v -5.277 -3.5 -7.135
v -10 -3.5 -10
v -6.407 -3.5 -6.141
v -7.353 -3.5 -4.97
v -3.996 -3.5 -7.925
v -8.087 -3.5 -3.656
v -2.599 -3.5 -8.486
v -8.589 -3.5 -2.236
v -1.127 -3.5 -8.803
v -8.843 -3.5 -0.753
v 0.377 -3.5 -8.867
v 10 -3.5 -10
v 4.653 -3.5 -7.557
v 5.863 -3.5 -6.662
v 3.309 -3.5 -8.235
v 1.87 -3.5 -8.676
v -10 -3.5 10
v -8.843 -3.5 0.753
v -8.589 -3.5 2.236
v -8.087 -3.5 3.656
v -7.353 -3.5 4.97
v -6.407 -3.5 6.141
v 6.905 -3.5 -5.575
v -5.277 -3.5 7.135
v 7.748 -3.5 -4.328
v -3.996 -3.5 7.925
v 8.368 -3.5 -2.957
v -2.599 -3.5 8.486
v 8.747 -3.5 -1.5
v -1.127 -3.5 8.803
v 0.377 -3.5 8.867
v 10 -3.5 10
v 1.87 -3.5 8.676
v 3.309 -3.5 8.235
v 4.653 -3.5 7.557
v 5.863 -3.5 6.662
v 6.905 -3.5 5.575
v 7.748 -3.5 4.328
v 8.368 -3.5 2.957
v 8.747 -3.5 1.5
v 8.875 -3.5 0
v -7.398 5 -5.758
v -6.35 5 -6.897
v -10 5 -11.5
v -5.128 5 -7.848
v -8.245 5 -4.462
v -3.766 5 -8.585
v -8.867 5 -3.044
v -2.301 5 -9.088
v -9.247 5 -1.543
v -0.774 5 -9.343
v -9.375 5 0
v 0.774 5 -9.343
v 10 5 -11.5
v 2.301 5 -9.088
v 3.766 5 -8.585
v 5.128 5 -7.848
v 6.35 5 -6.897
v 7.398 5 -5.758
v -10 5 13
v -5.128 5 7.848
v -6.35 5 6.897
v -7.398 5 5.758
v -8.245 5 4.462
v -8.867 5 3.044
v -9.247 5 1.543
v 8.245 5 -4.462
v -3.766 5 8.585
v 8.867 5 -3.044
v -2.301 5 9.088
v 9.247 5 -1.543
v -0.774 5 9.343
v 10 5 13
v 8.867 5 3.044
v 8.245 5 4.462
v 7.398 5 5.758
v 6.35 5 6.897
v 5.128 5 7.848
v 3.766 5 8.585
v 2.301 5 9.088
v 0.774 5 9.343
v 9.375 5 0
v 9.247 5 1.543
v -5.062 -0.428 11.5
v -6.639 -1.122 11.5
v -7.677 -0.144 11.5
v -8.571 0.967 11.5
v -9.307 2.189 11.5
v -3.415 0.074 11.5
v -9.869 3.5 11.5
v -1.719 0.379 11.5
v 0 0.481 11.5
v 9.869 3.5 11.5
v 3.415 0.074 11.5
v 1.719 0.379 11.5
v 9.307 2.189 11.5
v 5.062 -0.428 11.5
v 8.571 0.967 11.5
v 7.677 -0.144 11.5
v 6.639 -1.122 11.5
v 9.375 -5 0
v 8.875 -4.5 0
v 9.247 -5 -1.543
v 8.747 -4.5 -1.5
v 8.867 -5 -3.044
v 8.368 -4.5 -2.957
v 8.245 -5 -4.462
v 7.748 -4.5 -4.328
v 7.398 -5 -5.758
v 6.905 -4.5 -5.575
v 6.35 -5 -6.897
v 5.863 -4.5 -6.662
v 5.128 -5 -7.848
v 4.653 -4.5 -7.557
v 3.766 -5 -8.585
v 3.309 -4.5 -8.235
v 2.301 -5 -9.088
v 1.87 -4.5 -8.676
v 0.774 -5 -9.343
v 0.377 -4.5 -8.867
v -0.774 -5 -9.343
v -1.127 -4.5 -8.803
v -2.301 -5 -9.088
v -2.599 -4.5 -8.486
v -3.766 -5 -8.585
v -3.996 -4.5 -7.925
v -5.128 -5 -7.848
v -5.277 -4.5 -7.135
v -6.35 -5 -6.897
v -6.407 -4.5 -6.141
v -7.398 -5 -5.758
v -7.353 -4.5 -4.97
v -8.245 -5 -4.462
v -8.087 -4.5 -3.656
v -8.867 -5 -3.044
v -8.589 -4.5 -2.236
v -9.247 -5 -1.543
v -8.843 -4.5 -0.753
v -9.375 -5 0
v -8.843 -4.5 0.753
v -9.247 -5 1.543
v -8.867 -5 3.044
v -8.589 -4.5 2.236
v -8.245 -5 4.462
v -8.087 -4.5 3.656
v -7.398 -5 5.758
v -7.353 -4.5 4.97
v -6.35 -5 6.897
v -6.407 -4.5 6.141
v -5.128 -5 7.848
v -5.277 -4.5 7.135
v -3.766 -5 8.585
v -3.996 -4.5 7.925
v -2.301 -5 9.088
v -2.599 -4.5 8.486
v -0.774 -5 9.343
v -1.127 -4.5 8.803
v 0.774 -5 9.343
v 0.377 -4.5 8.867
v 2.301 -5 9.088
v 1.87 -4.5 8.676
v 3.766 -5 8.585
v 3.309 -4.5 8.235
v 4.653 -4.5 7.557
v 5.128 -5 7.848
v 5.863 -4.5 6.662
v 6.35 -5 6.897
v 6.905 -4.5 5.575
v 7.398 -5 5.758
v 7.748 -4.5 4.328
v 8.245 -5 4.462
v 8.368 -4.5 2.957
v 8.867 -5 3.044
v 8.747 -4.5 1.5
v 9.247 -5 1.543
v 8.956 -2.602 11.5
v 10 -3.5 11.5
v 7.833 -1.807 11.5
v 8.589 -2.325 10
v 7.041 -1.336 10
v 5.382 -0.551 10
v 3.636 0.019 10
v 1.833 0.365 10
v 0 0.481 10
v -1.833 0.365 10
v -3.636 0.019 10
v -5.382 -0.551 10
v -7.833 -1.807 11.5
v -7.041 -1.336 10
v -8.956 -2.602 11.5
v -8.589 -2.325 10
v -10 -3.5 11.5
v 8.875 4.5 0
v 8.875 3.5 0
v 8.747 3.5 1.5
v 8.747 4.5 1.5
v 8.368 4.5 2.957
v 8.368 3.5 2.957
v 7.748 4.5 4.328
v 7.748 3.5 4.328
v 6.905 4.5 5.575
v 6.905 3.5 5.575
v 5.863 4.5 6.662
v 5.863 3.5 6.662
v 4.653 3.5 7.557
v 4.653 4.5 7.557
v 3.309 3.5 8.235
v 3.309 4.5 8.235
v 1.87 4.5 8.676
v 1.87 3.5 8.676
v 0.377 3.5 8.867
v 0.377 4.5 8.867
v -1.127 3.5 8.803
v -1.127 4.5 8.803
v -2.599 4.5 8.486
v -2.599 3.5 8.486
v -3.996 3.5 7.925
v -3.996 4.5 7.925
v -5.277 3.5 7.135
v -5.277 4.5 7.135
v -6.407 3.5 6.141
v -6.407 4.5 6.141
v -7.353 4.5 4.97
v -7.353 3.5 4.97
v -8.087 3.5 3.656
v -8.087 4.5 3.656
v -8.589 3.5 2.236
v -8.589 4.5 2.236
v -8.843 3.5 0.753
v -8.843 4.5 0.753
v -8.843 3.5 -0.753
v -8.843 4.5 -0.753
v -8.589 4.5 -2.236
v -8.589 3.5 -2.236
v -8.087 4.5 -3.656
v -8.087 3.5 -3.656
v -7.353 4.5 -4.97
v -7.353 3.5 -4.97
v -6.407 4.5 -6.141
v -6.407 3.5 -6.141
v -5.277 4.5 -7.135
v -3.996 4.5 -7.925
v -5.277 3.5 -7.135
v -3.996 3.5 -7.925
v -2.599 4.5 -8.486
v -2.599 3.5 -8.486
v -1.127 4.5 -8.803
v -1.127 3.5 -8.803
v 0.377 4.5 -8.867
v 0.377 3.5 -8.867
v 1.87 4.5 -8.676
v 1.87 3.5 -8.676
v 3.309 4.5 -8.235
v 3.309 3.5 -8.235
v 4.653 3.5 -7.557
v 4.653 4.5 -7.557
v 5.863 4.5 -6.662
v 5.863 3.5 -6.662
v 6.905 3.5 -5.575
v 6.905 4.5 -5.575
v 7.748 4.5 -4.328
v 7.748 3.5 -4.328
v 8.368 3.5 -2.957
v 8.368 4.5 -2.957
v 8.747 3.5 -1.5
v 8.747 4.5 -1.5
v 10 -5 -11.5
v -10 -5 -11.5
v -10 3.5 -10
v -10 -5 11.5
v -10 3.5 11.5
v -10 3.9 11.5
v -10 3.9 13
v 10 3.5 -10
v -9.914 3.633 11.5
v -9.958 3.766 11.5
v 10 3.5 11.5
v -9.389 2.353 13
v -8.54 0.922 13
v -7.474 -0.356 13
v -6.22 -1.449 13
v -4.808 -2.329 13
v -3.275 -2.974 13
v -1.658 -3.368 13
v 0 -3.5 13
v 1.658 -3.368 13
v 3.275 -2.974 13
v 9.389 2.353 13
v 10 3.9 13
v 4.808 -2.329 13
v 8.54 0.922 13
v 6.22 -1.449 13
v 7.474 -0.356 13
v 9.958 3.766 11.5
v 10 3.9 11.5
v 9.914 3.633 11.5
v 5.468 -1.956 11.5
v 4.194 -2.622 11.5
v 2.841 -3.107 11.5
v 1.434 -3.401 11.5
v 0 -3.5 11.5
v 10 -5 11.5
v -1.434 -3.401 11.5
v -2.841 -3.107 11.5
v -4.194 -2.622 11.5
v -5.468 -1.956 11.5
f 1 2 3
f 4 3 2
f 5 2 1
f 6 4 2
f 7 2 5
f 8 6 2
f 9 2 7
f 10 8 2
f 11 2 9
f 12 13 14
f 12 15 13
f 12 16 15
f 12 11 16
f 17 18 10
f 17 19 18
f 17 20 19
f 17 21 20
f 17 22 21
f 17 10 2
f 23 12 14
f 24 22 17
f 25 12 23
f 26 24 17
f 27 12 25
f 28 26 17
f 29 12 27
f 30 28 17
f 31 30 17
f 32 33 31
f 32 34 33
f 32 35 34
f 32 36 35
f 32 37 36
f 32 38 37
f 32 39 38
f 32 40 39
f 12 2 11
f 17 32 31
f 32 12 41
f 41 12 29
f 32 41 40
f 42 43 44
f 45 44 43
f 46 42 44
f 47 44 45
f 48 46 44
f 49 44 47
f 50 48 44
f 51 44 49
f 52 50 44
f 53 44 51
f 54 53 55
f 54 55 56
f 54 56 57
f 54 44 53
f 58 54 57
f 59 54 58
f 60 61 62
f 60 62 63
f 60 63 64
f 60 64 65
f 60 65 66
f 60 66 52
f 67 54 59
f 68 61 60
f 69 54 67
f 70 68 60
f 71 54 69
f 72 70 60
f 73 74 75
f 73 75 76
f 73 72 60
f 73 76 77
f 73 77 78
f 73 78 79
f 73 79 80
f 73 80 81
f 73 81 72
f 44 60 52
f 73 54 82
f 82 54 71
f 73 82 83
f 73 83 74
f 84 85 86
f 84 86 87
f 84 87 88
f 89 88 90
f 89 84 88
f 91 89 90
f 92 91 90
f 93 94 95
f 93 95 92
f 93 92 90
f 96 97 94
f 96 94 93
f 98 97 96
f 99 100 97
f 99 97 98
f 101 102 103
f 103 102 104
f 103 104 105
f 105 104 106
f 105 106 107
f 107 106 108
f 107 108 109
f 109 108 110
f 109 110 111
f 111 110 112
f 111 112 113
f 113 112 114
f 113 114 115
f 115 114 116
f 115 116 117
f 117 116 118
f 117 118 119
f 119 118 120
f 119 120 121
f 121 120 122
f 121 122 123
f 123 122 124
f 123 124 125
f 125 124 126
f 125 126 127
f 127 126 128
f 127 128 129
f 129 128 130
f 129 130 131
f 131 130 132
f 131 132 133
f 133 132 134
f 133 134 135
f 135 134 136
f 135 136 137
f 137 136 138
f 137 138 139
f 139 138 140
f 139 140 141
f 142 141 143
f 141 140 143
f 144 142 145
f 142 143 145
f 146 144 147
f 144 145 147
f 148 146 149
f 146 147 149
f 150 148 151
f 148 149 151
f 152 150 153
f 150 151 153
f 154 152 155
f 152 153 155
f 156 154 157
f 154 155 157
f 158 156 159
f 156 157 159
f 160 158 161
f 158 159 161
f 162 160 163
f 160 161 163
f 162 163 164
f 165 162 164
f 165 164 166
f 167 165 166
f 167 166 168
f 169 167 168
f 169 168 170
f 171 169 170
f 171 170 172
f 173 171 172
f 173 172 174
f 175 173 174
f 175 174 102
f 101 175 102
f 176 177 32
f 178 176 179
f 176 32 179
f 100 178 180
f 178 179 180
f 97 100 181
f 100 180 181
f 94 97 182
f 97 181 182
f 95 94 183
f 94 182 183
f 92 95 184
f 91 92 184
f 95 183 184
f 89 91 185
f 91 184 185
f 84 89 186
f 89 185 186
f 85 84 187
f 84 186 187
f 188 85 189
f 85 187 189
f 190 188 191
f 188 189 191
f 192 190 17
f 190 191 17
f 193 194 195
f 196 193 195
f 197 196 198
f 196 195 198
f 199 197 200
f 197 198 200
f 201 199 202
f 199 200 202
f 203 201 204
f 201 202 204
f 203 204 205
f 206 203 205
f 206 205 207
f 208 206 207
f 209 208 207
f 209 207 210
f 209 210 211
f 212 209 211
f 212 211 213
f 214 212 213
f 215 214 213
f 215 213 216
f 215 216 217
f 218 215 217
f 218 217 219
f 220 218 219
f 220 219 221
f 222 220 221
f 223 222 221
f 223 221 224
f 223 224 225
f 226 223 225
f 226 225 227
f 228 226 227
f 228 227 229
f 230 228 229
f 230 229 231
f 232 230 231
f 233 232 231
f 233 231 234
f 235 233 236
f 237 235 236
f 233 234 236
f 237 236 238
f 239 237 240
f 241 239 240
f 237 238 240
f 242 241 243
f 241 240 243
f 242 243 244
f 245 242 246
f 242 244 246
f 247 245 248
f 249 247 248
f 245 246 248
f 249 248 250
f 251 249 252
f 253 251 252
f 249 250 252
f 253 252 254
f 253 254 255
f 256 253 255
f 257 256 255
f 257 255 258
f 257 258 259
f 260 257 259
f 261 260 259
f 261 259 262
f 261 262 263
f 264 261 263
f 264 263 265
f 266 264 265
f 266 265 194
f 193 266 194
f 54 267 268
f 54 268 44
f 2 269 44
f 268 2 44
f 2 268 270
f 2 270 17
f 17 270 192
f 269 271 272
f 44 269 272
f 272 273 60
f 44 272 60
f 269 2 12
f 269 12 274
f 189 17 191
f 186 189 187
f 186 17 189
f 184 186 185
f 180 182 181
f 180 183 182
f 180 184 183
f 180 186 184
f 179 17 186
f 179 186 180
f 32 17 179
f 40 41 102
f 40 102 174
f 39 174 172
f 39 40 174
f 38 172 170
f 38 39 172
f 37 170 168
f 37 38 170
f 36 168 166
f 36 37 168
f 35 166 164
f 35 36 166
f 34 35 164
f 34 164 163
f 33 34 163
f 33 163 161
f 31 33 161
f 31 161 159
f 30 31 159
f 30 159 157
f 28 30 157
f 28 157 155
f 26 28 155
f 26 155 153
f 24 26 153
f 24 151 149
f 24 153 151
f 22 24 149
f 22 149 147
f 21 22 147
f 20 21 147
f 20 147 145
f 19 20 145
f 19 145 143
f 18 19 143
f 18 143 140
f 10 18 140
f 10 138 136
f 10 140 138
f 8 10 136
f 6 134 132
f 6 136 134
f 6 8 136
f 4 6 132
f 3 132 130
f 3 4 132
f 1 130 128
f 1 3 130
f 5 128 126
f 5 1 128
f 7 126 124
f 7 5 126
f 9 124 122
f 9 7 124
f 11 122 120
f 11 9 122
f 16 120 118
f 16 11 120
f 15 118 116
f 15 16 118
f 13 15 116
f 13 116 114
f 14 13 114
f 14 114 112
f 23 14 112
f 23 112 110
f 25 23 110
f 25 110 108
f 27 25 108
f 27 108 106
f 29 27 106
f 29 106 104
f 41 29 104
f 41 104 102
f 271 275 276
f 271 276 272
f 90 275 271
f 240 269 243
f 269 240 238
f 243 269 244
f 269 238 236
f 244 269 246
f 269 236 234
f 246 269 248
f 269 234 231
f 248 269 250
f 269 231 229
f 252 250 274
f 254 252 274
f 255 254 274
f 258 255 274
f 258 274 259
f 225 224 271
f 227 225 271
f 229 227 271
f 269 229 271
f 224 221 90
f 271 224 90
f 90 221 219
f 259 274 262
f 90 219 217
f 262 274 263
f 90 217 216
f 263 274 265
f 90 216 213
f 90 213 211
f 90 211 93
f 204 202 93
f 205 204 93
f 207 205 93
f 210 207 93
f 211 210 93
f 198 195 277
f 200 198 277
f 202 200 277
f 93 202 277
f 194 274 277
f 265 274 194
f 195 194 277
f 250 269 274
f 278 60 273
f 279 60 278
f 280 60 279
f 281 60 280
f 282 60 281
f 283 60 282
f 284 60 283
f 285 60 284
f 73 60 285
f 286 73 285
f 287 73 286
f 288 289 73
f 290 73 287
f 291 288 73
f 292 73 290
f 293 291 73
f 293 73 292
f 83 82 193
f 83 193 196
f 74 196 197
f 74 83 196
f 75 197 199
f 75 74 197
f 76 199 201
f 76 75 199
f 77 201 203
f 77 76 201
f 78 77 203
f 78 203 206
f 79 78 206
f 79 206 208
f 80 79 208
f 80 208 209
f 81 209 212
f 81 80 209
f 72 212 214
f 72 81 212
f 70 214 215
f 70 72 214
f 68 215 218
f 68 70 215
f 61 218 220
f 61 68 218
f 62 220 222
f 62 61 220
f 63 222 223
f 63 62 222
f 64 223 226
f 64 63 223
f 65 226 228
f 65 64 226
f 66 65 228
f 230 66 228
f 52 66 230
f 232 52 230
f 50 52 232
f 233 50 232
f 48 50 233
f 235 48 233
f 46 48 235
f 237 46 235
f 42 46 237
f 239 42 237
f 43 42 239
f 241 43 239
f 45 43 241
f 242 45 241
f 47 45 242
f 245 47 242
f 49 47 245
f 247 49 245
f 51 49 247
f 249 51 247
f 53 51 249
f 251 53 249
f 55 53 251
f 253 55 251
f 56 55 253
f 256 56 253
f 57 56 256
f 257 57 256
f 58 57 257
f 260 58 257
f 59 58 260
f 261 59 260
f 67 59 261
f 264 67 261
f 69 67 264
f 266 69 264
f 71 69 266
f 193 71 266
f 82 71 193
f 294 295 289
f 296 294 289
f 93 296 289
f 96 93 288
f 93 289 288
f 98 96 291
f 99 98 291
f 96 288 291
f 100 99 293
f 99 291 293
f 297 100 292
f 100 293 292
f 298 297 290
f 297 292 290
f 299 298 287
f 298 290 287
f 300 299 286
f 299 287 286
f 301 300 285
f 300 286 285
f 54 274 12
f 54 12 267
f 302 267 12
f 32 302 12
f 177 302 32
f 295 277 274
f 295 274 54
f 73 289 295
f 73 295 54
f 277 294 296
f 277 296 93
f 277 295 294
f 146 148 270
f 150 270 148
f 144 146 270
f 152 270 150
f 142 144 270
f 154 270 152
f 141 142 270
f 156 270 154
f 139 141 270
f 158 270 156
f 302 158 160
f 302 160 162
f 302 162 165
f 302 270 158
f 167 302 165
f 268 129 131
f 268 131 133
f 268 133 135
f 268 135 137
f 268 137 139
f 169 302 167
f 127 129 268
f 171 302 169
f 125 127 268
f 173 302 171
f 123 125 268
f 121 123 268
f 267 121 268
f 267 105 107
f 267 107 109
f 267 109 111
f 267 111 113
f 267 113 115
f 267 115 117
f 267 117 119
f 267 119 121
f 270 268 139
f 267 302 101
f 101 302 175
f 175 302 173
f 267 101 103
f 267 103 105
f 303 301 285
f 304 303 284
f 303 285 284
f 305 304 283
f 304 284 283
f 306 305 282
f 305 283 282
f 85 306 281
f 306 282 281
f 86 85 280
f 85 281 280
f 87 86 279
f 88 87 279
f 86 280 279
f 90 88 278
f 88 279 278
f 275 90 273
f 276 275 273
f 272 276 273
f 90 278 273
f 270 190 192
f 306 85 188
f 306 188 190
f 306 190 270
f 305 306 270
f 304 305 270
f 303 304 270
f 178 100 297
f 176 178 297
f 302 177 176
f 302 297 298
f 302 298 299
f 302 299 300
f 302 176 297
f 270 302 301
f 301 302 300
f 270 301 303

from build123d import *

# Parameters (mm, degrees)
F0_W          = 7
F0_H          = 20
F2_DEPTH      = 10
F2_DEPTH_BACK = 10
F1_R          = 8.875
F3_DEPTH      = 25
F3_DEPTH_BACK = 25
F5_DEPTH      = 1.5
F7_DEPTH      = 1.5
F8_SIZE       = 0.5


with BuildPart() as f2:
    # F0 (on Right) → F2 (new body, two sides)
    with BuildSketch(Plane.YZ) as f2_sk:
        Polygon((5, 11.5), (3.5, 11.5), (-3.5, 11.5), (-5, 11.5), (-5, -11.5), (5, -11.5), align=None)
        Rectangle(F0_W, F0_H, mode=Mode.SUBTRACT)
        Polygon((-3.5, 11.5), (3.5, 11.5), (5, 11.5), (5, 13), (-3.5, 13), align=None)
    extrude(amount=F2_DEPTH)
    extrude(f2_sk.sketch, amount=-F2_DEPTH_BACK)

    # F1 (on Front) → F3 (cut, two sides)
    with BuildSketch(Plane.XZ) as f3_sk:
        Circle(F1_R)
    extrude(amount=-F3_DEPTH, mode=Mode.SUBTRACT)
    extrude(f3_sk.sketch, amount=F3_DEPTH_BACK, mode=Mode.SUBTRACT)

    # F4 (on face) → F5 (cut)
    with BuildSketch(Plane.XY.offset(13)):
        with BuildLine():
            ThreePointArc((0, -3.5), (-6.220128616, -1.4488224541), (-10, 3.9))
            Line((-10, 3.9), (-10, -3.5))
            Line((-10, -3.5), (0, -3.5))
        make_face()
        with BuildLine():
            ThreePointArc((10, 3.9), (6.220128616, -1.4488224541), (0, -3.5))
            Line((0, -3.5), (10, -3.5))
            Line((10, -3.5), (10, 3.9))
        make_face()
    extrude(amount=-F5_DEPTH, mode=Mode.SUBTRACT)

    # F6 (on face) → F7 (cut)
    with BuildSketch(Plane(origin=(0, 0, 10), x_dir=(1, 0, 0), z_dir=(0, 0, -1))):
        with BuildLine():
            ThreePointArc((10, 3.5), (0, -0.4807811985), (-10, 3.5))
            Line((-10, 3.5), (-10, -3.5))
            Line((-10, -3.5), (10, -3.5))
            Line((10, -3.5), (10, 3.5))
        make_face()
    extrude(amount=-F7_DEPTH, mode=Mode.SUBTRACT)

    # F8
    f8_edges = [f2.edges().sort_by_distance(p)[0] for p in [
        (-8.875, -5, 0),
        (-8.875, 5, 0),
    ]]
    chamfer(f8_edges, length=F8_SIZE)


solid = f2.part
